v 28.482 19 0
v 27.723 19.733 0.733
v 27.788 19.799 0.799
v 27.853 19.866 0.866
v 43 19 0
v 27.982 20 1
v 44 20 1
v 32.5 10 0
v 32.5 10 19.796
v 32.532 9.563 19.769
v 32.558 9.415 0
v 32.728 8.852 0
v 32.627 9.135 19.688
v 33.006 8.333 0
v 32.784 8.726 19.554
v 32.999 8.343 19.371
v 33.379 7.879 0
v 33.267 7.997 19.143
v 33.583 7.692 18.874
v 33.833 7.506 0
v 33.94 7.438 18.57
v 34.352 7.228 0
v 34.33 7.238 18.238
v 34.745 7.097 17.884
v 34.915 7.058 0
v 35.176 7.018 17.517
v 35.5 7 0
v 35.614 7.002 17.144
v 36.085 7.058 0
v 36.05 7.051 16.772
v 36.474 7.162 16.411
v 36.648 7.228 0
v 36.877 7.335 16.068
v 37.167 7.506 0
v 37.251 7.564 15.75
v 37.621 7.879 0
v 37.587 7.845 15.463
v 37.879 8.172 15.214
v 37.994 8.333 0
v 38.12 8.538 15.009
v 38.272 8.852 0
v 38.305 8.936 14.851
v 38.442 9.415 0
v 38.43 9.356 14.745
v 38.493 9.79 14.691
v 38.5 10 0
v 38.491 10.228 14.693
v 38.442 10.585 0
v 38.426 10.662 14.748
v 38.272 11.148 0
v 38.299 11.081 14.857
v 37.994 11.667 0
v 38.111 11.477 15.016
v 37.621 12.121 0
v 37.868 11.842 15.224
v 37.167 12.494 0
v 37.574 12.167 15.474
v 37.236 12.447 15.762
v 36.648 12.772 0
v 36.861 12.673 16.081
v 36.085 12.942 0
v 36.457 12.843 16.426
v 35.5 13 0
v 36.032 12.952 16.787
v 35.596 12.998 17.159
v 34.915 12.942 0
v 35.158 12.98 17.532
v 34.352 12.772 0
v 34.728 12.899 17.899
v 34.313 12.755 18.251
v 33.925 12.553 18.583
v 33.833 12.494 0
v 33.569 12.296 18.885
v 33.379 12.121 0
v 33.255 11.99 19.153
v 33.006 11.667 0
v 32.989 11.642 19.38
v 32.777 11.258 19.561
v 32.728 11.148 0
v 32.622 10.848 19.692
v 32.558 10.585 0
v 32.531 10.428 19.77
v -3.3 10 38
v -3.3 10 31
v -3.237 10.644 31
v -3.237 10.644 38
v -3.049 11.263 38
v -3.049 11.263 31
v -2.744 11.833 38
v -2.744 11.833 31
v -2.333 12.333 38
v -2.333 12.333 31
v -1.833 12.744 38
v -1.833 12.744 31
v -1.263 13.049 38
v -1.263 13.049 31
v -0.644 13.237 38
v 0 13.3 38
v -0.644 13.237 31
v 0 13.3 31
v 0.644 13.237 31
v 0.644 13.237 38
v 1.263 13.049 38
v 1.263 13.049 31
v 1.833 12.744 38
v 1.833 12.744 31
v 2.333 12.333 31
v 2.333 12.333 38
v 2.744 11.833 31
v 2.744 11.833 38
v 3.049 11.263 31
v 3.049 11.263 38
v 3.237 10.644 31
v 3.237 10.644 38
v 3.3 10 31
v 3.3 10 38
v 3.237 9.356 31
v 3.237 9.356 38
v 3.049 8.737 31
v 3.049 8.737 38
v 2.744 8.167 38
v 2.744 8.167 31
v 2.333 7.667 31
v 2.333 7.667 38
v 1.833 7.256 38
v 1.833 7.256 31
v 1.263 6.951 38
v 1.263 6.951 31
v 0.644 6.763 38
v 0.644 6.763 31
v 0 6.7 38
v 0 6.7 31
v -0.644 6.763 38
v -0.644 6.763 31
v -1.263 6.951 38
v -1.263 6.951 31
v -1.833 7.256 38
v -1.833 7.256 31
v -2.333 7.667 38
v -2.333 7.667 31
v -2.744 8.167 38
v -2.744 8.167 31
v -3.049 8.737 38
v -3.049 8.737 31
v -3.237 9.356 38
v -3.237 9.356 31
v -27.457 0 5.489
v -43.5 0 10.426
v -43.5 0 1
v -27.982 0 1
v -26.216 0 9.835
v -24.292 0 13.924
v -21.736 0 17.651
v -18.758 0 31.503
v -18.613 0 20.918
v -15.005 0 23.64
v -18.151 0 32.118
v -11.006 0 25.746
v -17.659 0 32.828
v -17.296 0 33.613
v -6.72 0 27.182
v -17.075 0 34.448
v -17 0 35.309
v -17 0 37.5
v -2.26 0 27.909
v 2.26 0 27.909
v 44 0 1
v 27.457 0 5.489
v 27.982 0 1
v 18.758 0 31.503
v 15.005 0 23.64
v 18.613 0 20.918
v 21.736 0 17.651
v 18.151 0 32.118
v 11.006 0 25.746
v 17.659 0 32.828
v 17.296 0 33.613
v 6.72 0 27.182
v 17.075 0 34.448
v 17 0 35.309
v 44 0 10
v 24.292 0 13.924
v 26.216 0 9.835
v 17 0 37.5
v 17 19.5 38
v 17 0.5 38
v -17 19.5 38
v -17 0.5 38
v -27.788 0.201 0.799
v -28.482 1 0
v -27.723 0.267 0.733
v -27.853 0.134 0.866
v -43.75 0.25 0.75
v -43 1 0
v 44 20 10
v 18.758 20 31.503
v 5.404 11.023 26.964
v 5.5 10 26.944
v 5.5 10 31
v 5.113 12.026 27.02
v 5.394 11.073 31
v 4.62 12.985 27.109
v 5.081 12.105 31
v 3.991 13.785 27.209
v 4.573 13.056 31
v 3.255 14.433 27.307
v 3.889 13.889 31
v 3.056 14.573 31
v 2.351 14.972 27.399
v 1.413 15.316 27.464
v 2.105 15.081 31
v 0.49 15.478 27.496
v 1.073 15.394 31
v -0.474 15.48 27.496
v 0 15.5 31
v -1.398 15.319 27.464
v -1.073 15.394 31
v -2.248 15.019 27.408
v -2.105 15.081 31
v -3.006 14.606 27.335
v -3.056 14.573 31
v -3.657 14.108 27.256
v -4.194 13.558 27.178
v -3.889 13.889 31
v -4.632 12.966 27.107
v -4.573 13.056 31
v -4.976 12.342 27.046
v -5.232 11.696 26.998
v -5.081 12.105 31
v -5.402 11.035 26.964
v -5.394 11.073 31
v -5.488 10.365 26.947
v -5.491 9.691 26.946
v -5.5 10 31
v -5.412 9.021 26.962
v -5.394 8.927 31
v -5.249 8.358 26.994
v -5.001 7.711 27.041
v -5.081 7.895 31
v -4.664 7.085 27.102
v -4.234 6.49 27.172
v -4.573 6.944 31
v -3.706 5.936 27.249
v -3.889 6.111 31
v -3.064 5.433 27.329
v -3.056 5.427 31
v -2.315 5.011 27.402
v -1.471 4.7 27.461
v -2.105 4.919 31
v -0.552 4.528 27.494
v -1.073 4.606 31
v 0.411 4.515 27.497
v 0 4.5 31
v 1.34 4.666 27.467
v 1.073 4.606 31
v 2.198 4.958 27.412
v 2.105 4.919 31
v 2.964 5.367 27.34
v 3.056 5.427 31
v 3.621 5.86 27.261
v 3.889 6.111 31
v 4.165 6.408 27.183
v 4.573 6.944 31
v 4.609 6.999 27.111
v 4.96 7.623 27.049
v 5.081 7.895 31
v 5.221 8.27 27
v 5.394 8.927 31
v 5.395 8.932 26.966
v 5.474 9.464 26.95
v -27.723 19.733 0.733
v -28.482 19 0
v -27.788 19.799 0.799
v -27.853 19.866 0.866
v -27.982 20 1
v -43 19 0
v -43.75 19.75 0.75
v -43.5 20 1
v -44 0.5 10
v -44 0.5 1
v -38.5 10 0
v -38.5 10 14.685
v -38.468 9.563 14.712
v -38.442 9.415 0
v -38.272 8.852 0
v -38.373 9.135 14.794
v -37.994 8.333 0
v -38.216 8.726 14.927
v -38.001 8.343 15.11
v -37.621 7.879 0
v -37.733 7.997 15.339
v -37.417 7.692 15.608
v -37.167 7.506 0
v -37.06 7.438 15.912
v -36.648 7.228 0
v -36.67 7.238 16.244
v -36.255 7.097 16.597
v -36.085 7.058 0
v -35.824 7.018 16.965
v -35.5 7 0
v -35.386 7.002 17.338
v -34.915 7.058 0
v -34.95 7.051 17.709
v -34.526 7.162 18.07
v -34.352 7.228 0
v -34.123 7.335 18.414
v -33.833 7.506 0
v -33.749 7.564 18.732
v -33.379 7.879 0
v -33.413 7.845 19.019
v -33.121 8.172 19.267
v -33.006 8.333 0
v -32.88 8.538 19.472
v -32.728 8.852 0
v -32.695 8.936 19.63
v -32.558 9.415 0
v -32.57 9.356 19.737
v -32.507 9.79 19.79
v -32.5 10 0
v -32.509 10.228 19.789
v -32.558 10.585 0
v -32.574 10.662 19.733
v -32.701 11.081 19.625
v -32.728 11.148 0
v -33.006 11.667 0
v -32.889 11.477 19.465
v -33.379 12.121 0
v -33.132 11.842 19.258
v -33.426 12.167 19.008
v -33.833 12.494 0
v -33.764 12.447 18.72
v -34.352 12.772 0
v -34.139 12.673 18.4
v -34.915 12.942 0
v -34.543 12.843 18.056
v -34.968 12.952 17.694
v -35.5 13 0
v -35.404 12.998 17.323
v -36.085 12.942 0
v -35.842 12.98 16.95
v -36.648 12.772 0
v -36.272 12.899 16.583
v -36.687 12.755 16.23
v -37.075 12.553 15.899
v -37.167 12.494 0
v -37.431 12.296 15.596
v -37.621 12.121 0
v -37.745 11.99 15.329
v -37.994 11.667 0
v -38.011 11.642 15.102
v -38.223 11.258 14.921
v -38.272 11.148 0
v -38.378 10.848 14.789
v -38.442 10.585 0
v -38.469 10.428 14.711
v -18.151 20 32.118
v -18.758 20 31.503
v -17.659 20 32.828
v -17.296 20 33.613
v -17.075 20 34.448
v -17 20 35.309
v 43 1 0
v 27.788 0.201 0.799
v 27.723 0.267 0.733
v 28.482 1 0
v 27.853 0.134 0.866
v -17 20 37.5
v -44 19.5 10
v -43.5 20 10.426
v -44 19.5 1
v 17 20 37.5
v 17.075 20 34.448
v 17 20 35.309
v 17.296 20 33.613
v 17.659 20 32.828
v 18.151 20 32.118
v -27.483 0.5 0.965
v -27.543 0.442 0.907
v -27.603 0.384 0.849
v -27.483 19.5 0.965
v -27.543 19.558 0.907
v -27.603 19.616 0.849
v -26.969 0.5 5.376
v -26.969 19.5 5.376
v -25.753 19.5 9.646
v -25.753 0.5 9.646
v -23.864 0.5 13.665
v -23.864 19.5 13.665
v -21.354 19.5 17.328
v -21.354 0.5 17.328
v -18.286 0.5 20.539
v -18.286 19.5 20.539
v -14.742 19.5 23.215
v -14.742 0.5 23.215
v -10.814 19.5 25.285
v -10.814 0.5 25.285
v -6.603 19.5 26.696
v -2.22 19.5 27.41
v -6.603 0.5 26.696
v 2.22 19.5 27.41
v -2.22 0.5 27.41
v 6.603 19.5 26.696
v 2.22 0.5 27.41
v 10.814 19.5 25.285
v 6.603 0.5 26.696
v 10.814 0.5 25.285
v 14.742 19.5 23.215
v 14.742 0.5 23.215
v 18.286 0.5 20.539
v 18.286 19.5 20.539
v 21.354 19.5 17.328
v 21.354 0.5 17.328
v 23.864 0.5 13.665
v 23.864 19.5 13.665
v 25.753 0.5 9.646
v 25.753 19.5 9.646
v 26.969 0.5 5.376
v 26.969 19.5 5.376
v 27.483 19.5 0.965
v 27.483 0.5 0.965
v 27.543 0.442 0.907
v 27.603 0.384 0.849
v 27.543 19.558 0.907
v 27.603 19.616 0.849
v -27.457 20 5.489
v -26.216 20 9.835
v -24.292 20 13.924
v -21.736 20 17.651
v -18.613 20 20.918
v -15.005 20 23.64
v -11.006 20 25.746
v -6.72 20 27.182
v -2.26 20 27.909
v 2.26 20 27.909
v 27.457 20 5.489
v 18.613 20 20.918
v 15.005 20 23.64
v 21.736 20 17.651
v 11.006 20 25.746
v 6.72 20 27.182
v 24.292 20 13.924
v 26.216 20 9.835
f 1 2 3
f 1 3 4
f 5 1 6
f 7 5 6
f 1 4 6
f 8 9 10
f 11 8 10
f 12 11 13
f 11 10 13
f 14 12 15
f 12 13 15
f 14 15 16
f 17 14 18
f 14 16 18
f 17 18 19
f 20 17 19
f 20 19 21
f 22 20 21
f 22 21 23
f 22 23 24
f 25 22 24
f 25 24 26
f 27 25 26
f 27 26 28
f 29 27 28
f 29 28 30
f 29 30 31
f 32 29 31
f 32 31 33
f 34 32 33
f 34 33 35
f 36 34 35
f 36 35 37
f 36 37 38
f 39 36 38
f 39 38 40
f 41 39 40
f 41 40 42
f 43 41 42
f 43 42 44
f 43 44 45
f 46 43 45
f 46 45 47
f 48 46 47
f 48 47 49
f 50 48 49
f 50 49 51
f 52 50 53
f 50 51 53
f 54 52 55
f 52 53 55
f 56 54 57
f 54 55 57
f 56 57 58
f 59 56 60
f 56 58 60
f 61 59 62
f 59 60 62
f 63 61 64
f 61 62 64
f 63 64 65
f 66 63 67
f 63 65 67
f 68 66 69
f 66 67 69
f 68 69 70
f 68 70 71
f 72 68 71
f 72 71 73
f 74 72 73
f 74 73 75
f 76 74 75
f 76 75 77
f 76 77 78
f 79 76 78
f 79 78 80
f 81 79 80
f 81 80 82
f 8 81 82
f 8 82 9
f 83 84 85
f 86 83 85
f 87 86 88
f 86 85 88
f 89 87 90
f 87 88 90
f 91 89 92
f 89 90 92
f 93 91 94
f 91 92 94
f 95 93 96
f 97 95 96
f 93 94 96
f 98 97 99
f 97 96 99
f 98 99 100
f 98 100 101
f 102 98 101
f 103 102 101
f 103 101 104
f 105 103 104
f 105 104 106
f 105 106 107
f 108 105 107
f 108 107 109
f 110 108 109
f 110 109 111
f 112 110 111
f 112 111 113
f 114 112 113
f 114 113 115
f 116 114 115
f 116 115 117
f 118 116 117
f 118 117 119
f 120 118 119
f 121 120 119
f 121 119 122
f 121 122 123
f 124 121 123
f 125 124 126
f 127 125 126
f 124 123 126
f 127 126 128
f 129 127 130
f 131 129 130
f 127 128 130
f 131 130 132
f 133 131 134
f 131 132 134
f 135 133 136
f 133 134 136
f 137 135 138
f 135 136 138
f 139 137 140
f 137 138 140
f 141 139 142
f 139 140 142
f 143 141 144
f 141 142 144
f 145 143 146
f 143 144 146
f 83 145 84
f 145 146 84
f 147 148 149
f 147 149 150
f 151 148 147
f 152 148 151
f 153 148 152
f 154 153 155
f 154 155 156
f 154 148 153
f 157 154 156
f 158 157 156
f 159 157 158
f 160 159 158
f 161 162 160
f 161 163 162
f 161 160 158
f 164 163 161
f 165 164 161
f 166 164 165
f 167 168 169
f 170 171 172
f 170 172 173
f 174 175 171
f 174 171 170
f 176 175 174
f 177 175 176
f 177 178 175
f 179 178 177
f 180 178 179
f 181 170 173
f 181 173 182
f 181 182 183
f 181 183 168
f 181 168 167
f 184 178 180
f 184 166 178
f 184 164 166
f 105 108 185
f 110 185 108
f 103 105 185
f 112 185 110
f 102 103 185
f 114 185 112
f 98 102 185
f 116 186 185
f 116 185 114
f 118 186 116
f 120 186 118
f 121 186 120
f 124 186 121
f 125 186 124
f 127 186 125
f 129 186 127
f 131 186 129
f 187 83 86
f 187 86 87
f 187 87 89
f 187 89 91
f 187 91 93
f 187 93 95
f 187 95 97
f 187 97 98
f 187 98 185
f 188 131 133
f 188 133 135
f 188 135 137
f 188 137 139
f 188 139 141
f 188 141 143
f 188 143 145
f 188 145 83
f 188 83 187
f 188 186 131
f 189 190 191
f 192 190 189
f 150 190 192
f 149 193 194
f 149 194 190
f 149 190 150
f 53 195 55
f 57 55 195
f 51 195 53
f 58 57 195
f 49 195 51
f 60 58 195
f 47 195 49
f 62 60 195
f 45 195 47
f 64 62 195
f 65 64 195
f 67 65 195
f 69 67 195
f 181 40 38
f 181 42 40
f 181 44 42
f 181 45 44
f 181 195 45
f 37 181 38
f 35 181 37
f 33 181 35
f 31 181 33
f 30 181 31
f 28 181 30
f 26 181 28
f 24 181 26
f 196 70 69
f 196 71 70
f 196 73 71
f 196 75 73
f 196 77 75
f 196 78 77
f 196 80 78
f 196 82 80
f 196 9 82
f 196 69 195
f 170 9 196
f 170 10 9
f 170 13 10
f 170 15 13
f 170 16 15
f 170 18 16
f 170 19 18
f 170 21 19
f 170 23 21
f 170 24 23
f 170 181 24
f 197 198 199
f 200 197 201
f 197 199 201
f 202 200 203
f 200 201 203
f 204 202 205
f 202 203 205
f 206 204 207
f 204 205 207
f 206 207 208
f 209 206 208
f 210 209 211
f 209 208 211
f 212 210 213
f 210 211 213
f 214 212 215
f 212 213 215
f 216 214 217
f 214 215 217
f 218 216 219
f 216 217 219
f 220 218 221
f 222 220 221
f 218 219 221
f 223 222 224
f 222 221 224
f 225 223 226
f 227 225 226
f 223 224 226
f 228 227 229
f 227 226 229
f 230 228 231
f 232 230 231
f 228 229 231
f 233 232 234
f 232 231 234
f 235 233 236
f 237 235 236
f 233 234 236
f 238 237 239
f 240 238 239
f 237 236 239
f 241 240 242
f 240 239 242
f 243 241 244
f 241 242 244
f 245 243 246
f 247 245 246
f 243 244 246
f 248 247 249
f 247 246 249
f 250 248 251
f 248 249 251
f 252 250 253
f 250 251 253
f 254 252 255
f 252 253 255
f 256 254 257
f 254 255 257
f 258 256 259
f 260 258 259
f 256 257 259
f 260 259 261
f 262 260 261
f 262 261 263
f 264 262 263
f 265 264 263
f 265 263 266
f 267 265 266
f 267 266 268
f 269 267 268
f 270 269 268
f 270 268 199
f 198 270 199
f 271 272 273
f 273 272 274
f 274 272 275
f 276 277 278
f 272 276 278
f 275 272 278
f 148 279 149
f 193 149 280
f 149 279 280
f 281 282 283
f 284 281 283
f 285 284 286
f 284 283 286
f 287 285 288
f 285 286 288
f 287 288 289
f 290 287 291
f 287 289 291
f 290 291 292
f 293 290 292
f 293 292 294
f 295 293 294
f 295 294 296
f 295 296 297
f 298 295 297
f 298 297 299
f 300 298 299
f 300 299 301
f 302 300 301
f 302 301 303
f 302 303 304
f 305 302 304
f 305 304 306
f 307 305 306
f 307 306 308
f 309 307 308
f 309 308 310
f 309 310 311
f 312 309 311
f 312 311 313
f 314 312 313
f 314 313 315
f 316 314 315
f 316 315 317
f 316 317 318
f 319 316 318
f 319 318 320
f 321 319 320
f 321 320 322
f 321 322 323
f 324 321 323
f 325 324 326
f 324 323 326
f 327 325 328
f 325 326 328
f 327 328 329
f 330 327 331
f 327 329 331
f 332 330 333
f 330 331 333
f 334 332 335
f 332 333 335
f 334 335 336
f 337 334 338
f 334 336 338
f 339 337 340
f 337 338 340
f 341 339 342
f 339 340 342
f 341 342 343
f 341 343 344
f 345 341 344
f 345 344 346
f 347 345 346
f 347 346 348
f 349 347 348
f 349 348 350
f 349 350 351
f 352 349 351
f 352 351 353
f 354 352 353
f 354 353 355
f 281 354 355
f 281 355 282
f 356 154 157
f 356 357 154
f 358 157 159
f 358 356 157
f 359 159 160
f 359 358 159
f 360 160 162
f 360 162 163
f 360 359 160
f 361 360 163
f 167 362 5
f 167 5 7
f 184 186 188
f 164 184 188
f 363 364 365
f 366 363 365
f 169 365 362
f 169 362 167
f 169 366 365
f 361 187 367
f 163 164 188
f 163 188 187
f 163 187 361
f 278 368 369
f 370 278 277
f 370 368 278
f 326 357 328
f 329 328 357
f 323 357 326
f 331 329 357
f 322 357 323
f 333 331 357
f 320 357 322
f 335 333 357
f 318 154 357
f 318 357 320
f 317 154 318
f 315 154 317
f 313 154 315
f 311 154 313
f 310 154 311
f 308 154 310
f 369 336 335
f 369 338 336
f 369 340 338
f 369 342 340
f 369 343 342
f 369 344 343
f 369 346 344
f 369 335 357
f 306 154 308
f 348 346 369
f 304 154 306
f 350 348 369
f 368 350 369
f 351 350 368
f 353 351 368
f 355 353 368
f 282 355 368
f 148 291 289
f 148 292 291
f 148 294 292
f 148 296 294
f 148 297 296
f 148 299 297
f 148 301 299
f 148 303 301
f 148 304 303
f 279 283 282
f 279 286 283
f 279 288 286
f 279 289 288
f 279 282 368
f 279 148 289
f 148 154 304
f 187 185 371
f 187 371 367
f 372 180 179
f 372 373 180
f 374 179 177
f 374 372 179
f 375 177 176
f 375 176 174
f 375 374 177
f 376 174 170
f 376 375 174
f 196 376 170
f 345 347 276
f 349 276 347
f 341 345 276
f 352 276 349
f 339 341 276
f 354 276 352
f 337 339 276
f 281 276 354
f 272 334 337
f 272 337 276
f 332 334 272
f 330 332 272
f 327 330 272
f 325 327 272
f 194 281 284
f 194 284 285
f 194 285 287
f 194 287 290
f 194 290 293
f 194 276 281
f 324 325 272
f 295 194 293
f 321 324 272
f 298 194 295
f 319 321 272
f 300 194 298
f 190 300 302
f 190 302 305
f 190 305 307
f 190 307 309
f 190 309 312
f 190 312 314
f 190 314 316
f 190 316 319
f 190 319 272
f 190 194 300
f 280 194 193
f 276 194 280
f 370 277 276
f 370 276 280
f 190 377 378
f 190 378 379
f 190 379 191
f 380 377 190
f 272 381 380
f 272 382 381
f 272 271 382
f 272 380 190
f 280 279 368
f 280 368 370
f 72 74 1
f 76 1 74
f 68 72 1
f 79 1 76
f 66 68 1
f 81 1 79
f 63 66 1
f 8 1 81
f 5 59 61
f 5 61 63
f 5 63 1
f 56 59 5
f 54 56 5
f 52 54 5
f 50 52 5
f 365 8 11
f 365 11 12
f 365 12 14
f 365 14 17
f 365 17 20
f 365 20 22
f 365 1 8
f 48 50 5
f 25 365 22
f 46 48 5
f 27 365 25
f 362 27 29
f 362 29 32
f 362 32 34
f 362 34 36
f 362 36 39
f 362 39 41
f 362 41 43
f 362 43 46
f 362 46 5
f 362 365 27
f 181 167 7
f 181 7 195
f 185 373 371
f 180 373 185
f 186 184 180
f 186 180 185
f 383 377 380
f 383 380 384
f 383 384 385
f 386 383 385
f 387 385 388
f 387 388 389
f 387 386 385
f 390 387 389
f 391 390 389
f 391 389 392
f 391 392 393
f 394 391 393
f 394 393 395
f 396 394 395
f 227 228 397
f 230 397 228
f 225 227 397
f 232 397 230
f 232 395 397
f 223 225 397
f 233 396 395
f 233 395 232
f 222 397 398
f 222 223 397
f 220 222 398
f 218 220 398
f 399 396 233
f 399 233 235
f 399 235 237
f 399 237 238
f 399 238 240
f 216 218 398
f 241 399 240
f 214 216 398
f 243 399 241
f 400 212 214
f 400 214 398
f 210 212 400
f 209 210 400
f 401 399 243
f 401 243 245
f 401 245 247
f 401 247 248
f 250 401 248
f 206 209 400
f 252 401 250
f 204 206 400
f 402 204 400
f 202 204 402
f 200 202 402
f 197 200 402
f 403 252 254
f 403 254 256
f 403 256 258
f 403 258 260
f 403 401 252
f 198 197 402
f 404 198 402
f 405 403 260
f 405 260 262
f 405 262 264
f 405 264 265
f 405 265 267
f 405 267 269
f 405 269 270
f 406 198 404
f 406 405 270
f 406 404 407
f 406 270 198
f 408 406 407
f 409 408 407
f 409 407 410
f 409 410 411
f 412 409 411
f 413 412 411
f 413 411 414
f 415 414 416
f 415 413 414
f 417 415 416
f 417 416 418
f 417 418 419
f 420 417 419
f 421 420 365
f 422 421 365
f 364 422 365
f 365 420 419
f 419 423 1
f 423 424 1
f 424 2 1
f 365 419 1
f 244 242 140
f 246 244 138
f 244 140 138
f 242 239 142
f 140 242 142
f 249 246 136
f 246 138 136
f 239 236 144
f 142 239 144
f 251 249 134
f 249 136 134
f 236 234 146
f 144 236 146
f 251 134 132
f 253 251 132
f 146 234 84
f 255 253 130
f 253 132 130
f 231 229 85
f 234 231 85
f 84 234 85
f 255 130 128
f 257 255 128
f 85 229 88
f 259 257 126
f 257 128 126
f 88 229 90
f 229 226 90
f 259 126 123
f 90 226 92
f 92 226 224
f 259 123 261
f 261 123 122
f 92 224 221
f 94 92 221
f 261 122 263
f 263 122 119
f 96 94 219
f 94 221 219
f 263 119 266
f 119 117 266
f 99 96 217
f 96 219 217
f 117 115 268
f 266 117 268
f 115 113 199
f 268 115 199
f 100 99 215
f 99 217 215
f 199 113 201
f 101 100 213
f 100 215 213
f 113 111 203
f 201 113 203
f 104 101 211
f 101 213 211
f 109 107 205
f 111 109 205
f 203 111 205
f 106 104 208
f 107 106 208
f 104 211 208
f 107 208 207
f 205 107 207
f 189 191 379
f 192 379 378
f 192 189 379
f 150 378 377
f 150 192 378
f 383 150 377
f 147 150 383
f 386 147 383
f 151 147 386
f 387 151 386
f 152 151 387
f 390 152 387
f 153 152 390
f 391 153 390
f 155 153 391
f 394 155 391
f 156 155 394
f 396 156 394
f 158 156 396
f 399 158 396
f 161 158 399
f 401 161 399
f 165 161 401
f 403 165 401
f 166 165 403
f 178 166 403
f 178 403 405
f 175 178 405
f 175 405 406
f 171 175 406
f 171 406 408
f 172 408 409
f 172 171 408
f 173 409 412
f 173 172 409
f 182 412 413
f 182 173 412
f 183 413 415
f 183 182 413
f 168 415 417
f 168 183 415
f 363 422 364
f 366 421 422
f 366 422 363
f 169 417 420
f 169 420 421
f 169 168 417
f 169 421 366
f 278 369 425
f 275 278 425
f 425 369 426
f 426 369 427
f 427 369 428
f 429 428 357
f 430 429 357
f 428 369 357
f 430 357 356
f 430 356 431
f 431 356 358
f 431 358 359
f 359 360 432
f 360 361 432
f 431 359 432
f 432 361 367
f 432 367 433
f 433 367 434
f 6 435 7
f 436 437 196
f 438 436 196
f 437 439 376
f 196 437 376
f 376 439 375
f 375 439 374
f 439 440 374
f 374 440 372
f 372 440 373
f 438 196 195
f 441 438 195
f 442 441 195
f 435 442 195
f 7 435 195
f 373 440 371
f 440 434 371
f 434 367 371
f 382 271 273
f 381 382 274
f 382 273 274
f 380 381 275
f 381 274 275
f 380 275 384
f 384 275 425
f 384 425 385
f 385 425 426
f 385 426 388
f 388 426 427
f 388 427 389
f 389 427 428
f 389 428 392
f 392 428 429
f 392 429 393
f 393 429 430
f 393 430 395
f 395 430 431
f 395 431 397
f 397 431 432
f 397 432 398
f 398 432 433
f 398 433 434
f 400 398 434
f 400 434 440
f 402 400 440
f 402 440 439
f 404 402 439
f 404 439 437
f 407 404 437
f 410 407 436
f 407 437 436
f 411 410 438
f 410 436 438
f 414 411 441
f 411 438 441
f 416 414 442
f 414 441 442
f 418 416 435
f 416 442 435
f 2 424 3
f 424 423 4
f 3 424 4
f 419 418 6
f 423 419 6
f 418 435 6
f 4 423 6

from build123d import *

# Parameters (mm, degrees)
F1_DEPTH    = 20
F3_D        = 6
F4_T1_DEPTH = 21.6433659759
F4_T3_DEPTH = 21.6433659759
F4_T5_DEPTH = 25.0580427678
F4_T7_DEPTH = 25.1433659759
F5_SIZE     = 0.5
F7_D        = 6.6
F9_R        = 5.5
F10_DEPTH   = 3.5
F11_R       = 5


# Not quite as in the source:
# - a fillet or chamfer that OpenCascade refuses, or shapes differently, is made with other operations: its cross-section is extruded or revolved along the edge and cut away or added
# - a feature names something its author has since deleted; it is built from what else it names


with BuildPart() as f1:
    # F0 (on Front) → F1 (new body)
    with BuildSketch(Plane.XZ):
        with BuildLine():
            ThreePointArc((-27.5, 0), (0, 27.5), (27.5, 0))
            Line((27.5, 0), (44, 0))
            Line((44, 0), (44, 10))
            Line((44, 10), (17, 33))
            Line((17, 33), (17, 38))
            Line((17, 38), (-17, 38))
            Line((-17, 38), (-17, 33))
            Line((-17, 33), (-44, 10))
            Line((-44, 10), (-44, 0))
            Line((-44, 0), (-27.5, 0))
        make_face()
    extrude(amount=-F1_DEPTH)

    # F3 (through all)
    with Locations(Plane(origin=(0, 0, 0), x_dir=(1, 0, 0), z_dir=(0, 0, -1))):
        with Locations((-35.5, -10), (35.5, -10)):
            Hole(F3_D / 2)

    # F4: chamfer of 1 on 8 edges, made by hand

    # F4_s2 → F4_t1 (cut)
    with BuildSketch(Plane.YZ.offset(24.928317012)):
        Polygon((19, 0), (20, 1), (20, 0), align=None)
        Polygon((1, 0), (0, 1), (0, 0), align=None)
    extrude(amount=F4_T1_DEPTH, mode=Mode.SUBTRACT)

    # F4_s4 → F4_t3 (cut)
    with BuildSketch(Plane.YZ.offset(-46.571682988)):
        Polygon((19, 0), (20, 1), (20, 0), align=None)
        Polygon((1, 0), (0, 1), (0, 0), align=None)
    extrude(amount=F4_T3_DEPTH, mode=Mode.SUBTRACT)

    # F4_s6 → F4_t5 (cut)
    with BuildSketch(Plane.XZ.offset(-22.5290213839)):
        with BuildLine():
            Line((-27.4830665009, 0.9649122807), (-28.4824507373, 0))
            Line((-28.4824507373, 0), (-27.5, 0))
            ThreePointArc((-27.5, 0), (-27.4955143469, 0.4966797747), (-27.4830665009, 0.9649122807))
        make_face()
        with BuildLine():
            Line((27.4830665009, 0.9649122807), (28.4824507373, 0))
            Line((28.4824507373, 0), (27.5, 0))
            ThreePointArc((27.5, 0), (27.4955143469, 0.4966797747), (27.4830665009, 0.9649122807))
        make_face()
    extrude(amount=F4_T5_DEPTH, mode=Mode.SUBTRACT)

    # F4_s8 → F4_t7 (cut)
    with BuildSketch(Plane.XZ.offset(-22.571682988)):
        Polygon((-43, 0), (-44, 1), (-44, 0), align=None)
        Polygon((43, 0), (44, 1), (44, 0), align=None)
    extrude(amount=F4_T7_DEPTH, mode=Mode.SUBTRACT)

    # F5
    f5_edges = [f1.edges().sort_by_distance(p)[0] for p in [
        (0, 20, 38),
        (0, 0, 38),
        (0, 20, 27.5),
        (-44, 20, 5.5),
        (0, 0, 27.5),
        (-44, 0, 5.5),
    ]]
    chamfer(f5_edges, length=F5_SIZE)

    # F7 (through all)
    with Locations(Plane.XY.offset(38)):
        with Locations((0, 10)):
            Hole(F7_D / 2)

    # F9 (on offset) → F10 (cut, symmetric)
    with BuildSketch(Plane.XY.offset(27.5)):
        with Locations((0, 10)):
            Circle(F9_R)
    extrude(amount=F10_DEPTH, both=True, mode=Mode.SUBTRACT)

    # F11
    f11_edges = [f1.edges().sort_by_distance(p)[0] for p in [
        (-17, 10, 33),
        (17, 10, 33),
    ]]
    fillet(f11_edges, radius=F11_R)


solid = f1.part
